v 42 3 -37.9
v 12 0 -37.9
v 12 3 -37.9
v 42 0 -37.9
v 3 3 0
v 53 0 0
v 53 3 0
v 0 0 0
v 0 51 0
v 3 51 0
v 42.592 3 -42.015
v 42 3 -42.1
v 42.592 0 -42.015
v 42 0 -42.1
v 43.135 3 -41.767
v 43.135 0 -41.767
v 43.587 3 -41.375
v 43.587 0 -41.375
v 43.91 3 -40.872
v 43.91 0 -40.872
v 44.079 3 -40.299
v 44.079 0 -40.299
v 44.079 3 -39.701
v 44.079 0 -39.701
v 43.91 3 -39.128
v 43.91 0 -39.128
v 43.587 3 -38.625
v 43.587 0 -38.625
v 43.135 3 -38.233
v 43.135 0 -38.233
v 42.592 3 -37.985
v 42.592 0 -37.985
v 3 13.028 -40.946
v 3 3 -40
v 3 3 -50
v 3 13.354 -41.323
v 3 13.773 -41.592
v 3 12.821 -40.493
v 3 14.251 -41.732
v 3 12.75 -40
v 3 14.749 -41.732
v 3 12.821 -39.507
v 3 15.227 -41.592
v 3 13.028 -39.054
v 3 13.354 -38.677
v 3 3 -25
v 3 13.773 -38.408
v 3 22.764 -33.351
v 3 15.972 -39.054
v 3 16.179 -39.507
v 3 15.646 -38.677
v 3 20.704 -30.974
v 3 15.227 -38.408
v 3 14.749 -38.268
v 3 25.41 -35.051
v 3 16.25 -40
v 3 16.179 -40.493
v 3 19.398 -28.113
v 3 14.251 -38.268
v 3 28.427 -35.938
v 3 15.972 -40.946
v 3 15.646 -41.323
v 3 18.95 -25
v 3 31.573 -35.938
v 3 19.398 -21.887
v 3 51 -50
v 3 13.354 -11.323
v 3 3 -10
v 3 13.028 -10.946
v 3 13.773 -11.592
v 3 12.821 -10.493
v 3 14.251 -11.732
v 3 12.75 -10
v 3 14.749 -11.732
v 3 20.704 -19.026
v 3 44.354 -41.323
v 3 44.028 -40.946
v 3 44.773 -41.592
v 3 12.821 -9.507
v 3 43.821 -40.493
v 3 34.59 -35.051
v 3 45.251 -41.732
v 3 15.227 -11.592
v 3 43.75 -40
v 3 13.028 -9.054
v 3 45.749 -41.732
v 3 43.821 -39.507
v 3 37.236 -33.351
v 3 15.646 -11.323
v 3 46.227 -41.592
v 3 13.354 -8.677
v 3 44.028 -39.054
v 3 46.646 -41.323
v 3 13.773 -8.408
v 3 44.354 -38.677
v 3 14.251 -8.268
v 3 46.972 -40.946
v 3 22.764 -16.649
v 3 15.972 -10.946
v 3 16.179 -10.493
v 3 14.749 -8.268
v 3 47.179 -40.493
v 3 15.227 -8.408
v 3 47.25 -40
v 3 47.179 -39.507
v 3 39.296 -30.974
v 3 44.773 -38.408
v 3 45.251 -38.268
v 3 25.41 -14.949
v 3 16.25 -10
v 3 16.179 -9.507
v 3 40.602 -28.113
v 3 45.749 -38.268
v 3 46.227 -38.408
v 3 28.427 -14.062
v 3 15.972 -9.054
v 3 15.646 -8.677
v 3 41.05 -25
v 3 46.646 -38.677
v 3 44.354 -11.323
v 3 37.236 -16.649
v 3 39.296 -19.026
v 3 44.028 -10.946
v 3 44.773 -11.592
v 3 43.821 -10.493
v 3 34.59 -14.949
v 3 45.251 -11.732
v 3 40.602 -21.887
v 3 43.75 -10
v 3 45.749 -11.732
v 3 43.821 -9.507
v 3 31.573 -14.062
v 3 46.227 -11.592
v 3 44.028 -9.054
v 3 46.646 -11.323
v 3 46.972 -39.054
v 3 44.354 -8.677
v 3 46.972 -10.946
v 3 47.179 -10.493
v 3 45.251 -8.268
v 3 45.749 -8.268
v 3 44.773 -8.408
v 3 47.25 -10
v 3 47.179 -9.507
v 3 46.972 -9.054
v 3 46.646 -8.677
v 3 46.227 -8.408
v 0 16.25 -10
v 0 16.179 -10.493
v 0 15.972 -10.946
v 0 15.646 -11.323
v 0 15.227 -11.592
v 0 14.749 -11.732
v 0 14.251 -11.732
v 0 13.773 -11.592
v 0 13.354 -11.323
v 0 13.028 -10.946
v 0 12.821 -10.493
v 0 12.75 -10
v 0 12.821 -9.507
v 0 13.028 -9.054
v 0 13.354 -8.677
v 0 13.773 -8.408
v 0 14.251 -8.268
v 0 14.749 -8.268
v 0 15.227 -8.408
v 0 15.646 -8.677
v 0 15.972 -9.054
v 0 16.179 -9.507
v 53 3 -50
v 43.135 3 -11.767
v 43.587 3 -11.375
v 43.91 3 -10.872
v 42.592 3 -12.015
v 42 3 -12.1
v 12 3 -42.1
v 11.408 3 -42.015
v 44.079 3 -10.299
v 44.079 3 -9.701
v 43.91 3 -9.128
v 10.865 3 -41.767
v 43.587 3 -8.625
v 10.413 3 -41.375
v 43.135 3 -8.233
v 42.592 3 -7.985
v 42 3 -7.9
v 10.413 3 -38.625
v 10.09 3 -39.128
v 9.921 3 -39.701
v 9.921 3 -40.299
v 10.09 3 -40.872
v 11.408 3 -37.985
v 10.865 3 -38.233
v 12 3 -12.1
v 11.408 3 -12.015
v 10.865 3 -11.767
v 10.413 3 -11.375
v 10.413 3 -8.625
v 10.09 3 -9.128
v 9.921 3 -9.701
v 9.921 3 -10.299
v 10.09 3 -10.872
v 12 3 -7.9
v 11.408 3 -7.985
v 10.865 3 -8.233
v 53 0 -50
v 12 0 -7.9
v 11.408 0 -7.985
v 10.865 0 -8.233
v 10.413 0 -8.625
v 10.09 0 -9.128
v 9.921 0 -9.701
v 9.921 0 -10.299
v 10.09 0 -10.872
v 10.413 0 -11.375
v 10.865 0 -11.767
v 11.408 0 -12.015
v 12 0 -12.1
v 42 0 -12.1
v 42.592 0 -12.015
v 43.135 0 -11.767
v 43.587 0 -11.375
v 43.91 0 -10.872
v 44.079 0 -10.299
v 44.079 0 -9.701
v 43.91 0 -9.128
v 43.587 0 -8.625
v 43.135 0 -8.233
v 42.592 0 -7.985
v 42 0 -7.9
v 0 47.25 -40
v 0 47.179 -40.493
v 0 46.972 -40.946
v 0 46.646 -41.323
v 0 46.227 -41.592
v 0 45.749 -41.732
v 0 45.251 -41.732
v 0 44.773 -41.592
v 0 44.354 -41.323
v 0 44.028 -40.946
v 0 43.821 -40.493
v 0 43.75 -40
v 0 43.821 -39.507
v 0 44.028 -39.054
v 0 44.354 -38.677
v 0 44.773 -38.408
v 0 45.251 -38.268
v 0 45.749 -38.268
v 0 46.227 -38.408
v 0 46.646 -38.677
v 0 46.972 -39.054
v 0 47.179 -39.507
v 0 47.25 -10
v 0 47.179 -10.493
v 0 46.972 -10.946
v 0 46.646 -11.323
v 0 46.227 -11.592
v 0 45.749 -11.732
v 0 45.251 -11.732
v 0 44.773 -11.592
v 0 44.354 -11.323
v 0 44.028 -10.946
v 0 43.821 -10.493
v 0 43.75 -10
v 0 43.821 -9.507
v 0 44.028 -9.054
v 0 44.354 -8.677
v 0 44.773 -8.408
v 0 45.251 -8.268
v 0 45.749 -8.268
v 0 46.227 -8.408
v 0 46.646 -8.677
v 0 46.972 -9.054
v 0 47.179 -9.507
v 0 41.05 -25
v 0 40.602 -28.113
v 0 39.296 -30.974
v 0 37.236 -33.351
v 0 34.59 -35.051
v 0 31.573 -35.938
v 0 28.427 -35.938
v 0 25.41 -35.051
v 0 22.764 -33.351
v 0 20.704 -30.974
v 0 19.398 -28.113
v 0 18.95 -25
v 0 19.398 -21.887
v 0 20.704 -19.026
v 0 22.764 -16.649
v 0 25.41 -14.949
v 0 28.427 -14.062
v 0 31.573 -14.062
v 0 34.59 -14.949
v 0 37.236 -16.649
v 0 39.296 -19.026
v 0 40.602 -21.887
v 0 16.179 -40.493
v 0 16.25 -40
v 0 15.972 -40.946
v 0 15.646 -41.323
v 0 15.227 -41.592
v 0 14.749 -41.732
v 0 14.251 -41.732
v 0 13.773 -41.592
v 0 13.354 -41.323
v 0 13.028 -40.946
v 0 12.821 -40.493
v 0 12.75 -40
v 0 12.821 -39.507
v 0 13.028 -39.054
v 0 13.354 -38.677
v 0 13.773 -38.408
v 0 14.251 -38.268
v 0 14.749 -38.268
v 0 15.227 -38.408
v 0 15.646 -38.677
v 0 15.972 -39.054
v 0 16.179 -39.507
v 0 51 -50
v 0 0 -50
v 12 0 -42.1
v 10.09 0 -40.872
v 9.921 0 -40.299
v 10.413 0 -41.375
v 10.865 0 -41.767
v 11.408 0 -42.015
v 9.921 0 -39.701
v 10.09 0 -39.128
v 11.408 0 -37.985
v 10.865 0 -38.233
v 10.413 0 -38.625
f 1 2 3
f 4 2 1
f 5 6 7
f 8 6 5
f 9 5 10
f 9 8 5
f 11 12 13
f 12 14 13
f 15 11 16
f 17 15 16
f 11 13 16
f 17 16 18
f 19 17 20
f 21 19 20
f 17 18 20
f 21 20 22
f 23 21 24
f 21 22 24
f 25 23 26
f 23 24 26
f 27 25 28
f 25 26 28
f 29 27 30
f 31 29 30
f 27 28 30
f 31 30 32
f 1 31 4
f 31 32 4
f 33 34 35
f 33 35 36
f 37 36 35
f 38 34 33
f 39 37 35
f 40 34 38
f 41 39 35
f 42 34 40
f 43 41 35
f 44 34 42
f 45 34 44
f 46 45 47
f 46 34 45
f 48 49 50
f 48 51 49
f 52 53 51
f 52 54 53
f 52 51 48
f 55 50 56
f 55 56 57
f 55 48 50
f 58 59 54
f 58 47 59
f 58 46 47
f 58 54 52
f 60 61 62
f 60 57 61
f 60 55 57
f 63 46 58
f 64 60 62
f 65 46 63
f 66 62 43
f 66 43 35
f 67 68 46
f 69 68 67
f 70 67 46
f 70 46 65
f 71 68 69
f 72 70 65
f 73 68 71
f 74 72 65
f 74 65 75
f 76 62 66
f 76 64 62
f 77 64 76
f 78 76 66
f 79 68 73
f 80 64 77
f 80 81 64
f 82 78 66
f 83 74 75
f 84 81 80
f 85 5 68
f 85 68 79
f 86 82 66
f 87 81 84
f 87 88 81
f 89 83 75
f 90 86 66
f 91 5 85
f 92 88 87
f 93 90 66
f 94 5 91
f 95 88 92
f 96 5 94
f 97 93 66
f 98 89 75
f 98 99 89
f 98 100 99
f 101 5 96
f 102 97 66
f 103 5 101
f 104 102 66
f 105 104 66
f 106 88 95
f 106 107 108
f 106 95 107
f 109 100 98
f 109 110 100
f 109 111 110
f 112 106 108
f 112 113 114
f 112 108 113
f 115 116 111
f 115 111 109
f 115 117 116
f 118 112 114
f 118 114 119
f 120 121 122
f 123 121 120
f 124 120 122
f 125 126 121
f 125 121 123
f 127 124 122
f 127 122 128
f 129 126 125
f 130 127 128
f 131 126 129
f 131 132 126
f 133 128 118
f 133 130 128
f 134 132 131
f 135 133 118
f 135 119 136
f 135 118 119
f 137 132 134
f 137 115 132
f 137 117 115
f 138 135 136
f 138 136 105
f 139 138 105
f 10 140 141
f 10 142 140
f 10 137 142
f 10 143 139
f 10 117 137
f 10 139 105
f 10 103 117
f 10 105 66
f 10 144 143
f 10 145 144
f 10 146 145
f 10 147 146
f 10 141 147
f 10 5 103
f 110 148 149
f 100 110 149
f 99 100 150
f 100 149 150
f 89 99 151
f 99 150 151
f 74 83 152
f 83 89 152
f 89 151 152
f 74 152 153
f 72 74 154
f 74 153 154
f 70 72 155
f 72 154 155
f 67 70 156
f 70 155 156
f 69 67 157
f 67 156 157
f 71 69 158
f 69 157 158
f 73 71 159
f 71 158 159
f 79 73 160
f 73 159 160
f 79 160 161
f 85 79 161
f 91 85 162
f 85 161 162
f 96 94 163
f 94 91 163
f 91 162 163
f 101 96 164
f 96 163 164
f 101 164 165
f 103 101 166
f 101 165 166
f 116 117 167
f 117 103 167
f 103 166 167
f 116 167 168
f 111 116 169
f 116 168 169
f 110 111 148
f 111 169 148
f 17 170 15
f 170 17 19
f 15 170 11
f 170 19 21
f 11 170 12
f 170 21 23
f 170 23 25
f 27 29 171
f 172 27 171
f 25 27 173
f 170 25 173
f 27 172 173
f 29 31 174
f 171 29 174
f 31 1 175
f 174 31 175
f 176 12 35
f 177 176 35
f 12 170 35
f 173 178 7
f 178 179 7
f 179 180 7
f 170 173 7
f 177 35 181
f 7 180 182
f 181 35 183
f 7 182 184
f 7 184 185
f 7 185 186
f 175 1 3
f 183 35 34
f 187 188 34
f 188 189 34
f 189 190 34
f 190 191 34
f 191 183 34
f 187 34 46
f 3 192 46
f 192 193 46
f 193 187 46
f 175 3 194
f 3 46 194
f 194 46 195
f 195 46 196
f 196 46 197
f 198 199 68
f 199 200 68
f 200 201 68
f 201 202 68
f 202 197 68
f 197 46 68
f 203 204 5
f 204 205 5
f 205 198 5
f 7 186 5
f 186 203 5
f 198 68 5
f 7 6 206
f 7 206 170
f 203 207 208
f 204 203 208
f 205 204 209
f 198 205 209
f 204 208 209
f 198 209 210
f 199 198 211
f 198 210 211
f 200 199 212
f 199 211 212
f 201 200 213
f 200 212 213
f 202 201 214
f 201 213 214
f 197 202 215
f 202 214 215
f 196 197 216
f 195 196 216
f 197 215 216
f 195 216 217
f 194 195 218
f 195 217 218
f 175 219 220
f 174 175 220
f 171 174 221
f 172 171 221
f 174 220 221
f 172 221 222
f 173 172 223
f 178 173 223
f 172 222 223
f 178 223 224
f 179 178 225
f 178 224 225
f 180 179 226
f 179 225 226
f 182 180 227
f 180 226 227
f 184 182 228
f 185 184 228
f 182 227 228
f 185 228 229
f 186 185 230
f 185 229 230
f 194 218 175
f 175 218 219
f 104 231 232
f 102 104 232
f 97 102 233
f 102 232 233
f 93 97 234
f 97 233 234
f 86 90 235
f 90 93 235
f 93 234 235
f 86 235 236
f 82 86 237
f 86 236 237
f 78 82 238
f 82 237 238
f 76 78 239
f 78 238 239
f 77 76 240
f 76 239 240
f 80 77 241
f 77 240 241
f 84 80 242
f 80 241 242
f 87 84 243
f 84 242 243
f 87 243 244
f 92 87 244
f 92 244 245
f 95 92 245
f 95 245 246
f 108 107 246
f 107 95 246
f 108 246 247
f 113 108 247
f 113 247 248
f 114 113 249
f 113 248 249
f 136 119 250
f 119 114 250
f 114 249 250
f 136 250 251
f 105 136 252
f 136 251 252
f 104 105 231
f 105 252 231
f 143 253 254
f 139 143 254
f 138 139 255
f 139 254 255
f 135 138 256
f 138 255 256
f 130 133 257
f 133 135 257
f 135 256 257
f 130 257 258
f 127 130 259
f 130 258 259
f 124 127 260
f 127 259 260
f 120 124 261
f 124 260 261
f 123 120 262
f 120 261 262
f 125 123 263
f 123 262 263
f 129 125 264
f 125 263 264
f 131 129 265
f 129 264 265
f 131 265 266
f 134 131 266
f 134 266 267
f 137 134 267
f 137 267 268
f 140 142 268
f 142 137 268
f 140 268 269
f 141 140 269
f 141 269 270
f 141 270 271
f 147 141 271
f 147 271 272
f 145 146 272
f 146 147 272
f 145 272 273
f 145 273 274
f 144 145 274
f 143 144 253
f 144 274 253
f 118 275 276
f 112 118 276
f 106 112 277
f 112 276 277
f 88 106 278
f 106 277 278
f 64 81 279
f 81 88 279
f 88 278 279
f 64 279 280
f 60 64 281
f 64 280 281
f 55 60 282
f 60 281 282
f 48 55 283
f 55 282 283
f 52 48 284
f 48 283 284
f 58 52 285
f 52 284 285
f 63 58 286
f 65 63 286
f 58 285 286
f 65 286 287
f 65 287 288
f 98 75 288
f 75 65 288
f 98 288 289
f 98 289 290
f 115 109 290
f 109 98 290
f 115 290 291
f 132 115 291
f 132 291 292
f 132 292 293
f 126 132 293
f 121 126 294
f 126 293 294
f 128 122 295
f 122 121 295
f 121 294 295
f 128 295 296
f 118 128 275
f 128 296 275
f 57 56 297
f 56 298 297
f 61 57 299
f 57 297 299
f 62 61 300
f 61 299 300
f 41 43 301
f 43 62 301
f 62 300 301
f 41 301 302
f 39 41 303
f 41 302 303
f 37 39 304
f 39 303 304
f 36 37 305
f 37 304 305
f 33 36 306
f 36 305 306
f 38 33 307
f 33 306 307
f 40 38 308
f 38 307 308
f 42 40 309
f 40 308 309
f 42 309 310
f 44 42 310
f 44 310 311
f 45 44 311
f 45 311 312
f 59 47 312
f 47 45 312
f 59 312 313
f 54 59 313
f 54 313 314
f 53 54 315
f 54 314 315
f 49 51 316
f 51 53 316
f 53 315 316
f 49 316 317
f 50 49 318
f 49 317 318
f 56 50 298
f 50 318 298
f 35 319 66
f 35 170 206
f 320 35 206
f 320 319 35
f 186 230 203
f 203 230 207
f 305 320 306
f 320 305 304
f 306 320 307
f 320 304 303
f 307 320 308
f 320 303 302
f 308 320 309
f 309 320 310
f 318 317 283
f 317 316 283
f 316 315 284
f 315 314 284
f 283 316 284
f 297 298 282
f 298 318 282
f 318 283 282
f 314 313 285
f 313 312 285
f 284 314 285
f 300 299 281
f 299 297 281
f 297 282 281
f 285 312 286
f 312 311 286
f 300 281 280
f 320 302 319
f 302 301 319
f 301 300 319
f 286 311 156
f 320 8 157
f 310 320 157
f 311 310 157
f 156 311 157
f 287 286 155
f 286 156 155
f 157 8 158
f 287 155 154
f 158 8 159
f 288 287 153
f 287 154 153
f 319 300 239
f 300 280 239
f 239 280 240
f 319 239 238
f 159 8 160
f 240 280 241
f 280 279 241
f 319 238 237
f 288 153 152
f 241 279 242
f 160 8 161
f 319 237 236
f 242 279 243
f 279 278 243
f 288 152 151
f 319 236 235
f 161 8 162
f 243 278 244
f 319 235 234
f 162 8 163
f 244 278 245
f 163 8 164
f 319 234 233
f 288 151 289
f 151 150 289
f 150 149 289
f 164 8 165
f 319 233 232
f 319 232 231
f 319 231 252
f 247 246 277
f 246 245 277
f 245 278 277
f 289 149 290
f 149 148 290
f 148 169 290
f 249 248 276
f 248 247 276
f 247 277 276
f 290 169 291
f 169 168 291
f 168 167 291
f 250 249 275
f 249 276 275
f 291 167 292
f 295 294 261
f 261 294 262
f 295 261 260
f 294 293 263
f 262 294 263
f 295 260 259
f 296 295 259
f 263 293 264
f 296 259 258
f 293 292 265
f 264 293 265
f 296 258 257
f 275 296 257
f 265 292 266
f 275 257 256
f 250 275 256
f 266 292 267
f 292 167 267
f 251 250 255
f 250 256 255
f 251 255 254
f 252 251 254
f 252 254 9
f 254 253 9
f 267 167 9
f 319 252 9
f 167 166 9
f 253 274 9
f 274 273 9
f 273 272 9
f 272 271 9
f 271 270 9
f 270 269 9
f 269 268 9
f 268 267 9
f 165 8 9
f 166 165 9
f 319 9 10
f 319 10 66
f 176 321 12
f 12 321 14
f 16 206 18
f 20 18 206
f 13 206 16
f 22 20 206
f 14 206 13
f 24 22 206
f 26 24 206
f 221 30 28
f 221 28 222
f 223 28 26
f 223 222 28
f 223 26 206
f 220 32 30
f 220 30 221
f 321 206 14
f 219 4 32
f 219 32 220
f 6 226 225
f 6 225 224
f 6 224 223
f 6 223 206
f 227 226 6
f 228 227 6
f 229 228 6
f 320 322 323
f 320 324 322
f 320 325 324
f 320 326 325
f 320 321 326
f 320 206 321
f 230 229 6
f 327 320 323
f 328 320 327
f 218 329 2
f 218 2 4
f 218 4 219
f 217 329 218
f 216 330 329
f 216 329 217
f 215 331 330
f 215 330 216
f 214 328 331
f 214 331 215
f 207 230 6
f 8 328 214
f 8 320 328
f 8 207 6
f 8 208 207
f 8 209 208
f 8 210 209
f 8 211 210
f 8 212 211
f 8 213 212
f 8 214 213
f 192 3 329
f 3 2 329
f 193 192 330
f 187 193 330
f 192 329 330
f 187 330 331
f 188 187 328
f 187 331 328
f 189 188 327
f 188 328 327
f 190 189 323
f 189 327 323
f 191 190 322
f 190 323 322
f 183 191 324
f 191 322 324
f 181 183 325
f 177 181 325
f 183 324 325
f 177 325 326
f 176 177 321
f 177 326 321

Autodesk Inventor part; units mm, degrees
ref_plane "YZ Plane" through (0, 0, 0) normal (1, 0, 0) x (0, 1, 0)
ref_plane "XZ Plane" through (0, 0, 0) normal (0, 1, 0) x (-1, 0, 0)
ref_plane "XY Plane" through (0, 0, 0) normal (0, 0, 1) x (1, 0, 0)
sketch "스케치1" plane through (0, 0, 0) normal (1, 0, 0) x (0, 1, 0)
  line L0 (0, 0) -> (51, 0)
  line L1 (51, 0) -> (51, -50)
  line L2 (51, -50) -> (0, -50)
  line L3 (0, -50) -> (0, 0)
  line L4 (0, -25) -> (30, -25)
  line L5 (0, -10) -> (14.5, -10)
  line L6 (0, -40) -> (14.5, -40)
  line L7 (14.5, -10) -> (45.5, -10)
  line L8 (14.5, -40) -> (45.5, -40)
  circle A0 centre (45.5, -10) radius 1.75
  circle A1 centre (14.5, -10) radius 1.75
  circle A2 centre (45.5, -40) radius 1.75
  circle A3 centre (14.5, -40) radius 1.75
  circle A4 centre (30, -25) radius 11.05
  line L9 (3, -50) -> (3, 0)
  dimension "d0" = 51
  dimension "d1" = 50
  dimension "d2" = 30
  dimension "d3" = 14.5
  dimension "d4" = 14.5
  dimension "d5" = 31
  dimension "d6" = 31
  dimension "d7" = 3.5
  dimension "d8" = 3.5
  dimension "d9" = 3.5
  dimension "d10" = 3.5
  dimension "d11" = 22.1
extrude "돌출1" add sketch "스케치1" along normal blind 3 contours L0 L1 L2 L9
extrude "돌출2" add sketch "스케치1" along normal blind 53 contours L0 L9 L5 L3 | L5 L9 L4 L3 | L4 L9 L6 L3 | L6 L9 L2 L3
sketch "스케치2" plane through (0, 0, -50) normal (0, -1, 0) x (1, 0, 0)
  line L0 (53, 0) -> (53, 10)
  line L1 (53, 0) -> (53, 50) projected
  line L2 (53, 10) -> (42, 10)
  line L3 (53, 50) -> (53, 40)
  line L4 (53, 40) -> (42, 40)
  arc A0 (12, 12.1) -> (12, 7.9) centre (12, 10) ccw
  arc A1 (42, 7.9) -> (42, 12.1) centre (42, 10) ccw
  arc A2 (12, 42.1) -> (12, 37.9) centre (12, 40) ccw
  arc A3 (42, 37.9) -> (42, 42.1) centre (42, 40) ccw
  line L5 (12, 12.1) -> (42, 12.1)
  line L6 (12, 37.9) -> (42, 37.9)
  line L7 (42, 42.1) -> (12, 42.1)
  line L8 (12, 7.9) -> (42, 7.9)
  point P0 (0, 50)
  dimension "d16" = 10
  dimension "d17" = 11
  dimension "d18" = 10
  dimension "d19" = 11
  dimension "d22" = 4.2
  dimension "d23" = 4.2
  dimension "d24" = 4.2
  dimension "d25" = 4.2
extrude "돌출3" cut sketch "스케치2" against normal blind 3
properties part number "모터 브라켓"
